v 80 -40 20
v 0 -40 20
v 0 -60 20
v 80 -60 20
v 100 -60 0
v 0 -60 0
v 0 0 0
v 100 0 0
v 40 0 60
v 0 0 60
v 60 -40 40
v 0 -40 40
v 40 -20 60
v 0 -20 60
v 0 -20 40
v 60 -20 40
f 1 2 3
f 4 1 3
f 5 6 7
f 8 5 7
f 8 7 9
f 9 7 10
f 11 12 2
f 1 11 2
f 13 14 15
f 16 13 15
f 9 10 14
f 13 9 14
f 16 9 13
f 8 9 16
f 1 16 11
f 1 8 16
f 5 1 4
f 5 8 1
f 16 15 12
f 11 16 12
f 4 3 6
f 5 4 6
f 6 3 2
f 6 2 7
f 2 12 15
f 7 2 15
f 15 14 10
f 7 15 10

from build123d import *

# Parameters (mm, degrees)
F1_DEPTH = 100
F2_SIZE  = 59.99999


# Not quite as in the source:
# - a fillet or chamfer is up to 0.001 mm smaller than in the source, because OpenCascade refuses the exact size


with BuildPart() as f1:
    # F0 (on Right) → F1 (new body)
    with BuildSketch(Plane.YZ):
        Polygon((-60, 0), (0, 0), (0, 60), (-20, 60), (-20, 40), (-40, 40), (-40, 20), (-60, 20), align=None)
    extrude(amount=F1_DEPTH)

    # F2 (size 60 in the source; OpenCascade refuses exactly that, so slightly less here)
    f2_edges = [f1.edges().sort_by_distance(p)[0] for p in [
        (100, -10, 60),
    ]]
    chamfer(f2_edges, length=F2_SIZE)


solid = f1.part
